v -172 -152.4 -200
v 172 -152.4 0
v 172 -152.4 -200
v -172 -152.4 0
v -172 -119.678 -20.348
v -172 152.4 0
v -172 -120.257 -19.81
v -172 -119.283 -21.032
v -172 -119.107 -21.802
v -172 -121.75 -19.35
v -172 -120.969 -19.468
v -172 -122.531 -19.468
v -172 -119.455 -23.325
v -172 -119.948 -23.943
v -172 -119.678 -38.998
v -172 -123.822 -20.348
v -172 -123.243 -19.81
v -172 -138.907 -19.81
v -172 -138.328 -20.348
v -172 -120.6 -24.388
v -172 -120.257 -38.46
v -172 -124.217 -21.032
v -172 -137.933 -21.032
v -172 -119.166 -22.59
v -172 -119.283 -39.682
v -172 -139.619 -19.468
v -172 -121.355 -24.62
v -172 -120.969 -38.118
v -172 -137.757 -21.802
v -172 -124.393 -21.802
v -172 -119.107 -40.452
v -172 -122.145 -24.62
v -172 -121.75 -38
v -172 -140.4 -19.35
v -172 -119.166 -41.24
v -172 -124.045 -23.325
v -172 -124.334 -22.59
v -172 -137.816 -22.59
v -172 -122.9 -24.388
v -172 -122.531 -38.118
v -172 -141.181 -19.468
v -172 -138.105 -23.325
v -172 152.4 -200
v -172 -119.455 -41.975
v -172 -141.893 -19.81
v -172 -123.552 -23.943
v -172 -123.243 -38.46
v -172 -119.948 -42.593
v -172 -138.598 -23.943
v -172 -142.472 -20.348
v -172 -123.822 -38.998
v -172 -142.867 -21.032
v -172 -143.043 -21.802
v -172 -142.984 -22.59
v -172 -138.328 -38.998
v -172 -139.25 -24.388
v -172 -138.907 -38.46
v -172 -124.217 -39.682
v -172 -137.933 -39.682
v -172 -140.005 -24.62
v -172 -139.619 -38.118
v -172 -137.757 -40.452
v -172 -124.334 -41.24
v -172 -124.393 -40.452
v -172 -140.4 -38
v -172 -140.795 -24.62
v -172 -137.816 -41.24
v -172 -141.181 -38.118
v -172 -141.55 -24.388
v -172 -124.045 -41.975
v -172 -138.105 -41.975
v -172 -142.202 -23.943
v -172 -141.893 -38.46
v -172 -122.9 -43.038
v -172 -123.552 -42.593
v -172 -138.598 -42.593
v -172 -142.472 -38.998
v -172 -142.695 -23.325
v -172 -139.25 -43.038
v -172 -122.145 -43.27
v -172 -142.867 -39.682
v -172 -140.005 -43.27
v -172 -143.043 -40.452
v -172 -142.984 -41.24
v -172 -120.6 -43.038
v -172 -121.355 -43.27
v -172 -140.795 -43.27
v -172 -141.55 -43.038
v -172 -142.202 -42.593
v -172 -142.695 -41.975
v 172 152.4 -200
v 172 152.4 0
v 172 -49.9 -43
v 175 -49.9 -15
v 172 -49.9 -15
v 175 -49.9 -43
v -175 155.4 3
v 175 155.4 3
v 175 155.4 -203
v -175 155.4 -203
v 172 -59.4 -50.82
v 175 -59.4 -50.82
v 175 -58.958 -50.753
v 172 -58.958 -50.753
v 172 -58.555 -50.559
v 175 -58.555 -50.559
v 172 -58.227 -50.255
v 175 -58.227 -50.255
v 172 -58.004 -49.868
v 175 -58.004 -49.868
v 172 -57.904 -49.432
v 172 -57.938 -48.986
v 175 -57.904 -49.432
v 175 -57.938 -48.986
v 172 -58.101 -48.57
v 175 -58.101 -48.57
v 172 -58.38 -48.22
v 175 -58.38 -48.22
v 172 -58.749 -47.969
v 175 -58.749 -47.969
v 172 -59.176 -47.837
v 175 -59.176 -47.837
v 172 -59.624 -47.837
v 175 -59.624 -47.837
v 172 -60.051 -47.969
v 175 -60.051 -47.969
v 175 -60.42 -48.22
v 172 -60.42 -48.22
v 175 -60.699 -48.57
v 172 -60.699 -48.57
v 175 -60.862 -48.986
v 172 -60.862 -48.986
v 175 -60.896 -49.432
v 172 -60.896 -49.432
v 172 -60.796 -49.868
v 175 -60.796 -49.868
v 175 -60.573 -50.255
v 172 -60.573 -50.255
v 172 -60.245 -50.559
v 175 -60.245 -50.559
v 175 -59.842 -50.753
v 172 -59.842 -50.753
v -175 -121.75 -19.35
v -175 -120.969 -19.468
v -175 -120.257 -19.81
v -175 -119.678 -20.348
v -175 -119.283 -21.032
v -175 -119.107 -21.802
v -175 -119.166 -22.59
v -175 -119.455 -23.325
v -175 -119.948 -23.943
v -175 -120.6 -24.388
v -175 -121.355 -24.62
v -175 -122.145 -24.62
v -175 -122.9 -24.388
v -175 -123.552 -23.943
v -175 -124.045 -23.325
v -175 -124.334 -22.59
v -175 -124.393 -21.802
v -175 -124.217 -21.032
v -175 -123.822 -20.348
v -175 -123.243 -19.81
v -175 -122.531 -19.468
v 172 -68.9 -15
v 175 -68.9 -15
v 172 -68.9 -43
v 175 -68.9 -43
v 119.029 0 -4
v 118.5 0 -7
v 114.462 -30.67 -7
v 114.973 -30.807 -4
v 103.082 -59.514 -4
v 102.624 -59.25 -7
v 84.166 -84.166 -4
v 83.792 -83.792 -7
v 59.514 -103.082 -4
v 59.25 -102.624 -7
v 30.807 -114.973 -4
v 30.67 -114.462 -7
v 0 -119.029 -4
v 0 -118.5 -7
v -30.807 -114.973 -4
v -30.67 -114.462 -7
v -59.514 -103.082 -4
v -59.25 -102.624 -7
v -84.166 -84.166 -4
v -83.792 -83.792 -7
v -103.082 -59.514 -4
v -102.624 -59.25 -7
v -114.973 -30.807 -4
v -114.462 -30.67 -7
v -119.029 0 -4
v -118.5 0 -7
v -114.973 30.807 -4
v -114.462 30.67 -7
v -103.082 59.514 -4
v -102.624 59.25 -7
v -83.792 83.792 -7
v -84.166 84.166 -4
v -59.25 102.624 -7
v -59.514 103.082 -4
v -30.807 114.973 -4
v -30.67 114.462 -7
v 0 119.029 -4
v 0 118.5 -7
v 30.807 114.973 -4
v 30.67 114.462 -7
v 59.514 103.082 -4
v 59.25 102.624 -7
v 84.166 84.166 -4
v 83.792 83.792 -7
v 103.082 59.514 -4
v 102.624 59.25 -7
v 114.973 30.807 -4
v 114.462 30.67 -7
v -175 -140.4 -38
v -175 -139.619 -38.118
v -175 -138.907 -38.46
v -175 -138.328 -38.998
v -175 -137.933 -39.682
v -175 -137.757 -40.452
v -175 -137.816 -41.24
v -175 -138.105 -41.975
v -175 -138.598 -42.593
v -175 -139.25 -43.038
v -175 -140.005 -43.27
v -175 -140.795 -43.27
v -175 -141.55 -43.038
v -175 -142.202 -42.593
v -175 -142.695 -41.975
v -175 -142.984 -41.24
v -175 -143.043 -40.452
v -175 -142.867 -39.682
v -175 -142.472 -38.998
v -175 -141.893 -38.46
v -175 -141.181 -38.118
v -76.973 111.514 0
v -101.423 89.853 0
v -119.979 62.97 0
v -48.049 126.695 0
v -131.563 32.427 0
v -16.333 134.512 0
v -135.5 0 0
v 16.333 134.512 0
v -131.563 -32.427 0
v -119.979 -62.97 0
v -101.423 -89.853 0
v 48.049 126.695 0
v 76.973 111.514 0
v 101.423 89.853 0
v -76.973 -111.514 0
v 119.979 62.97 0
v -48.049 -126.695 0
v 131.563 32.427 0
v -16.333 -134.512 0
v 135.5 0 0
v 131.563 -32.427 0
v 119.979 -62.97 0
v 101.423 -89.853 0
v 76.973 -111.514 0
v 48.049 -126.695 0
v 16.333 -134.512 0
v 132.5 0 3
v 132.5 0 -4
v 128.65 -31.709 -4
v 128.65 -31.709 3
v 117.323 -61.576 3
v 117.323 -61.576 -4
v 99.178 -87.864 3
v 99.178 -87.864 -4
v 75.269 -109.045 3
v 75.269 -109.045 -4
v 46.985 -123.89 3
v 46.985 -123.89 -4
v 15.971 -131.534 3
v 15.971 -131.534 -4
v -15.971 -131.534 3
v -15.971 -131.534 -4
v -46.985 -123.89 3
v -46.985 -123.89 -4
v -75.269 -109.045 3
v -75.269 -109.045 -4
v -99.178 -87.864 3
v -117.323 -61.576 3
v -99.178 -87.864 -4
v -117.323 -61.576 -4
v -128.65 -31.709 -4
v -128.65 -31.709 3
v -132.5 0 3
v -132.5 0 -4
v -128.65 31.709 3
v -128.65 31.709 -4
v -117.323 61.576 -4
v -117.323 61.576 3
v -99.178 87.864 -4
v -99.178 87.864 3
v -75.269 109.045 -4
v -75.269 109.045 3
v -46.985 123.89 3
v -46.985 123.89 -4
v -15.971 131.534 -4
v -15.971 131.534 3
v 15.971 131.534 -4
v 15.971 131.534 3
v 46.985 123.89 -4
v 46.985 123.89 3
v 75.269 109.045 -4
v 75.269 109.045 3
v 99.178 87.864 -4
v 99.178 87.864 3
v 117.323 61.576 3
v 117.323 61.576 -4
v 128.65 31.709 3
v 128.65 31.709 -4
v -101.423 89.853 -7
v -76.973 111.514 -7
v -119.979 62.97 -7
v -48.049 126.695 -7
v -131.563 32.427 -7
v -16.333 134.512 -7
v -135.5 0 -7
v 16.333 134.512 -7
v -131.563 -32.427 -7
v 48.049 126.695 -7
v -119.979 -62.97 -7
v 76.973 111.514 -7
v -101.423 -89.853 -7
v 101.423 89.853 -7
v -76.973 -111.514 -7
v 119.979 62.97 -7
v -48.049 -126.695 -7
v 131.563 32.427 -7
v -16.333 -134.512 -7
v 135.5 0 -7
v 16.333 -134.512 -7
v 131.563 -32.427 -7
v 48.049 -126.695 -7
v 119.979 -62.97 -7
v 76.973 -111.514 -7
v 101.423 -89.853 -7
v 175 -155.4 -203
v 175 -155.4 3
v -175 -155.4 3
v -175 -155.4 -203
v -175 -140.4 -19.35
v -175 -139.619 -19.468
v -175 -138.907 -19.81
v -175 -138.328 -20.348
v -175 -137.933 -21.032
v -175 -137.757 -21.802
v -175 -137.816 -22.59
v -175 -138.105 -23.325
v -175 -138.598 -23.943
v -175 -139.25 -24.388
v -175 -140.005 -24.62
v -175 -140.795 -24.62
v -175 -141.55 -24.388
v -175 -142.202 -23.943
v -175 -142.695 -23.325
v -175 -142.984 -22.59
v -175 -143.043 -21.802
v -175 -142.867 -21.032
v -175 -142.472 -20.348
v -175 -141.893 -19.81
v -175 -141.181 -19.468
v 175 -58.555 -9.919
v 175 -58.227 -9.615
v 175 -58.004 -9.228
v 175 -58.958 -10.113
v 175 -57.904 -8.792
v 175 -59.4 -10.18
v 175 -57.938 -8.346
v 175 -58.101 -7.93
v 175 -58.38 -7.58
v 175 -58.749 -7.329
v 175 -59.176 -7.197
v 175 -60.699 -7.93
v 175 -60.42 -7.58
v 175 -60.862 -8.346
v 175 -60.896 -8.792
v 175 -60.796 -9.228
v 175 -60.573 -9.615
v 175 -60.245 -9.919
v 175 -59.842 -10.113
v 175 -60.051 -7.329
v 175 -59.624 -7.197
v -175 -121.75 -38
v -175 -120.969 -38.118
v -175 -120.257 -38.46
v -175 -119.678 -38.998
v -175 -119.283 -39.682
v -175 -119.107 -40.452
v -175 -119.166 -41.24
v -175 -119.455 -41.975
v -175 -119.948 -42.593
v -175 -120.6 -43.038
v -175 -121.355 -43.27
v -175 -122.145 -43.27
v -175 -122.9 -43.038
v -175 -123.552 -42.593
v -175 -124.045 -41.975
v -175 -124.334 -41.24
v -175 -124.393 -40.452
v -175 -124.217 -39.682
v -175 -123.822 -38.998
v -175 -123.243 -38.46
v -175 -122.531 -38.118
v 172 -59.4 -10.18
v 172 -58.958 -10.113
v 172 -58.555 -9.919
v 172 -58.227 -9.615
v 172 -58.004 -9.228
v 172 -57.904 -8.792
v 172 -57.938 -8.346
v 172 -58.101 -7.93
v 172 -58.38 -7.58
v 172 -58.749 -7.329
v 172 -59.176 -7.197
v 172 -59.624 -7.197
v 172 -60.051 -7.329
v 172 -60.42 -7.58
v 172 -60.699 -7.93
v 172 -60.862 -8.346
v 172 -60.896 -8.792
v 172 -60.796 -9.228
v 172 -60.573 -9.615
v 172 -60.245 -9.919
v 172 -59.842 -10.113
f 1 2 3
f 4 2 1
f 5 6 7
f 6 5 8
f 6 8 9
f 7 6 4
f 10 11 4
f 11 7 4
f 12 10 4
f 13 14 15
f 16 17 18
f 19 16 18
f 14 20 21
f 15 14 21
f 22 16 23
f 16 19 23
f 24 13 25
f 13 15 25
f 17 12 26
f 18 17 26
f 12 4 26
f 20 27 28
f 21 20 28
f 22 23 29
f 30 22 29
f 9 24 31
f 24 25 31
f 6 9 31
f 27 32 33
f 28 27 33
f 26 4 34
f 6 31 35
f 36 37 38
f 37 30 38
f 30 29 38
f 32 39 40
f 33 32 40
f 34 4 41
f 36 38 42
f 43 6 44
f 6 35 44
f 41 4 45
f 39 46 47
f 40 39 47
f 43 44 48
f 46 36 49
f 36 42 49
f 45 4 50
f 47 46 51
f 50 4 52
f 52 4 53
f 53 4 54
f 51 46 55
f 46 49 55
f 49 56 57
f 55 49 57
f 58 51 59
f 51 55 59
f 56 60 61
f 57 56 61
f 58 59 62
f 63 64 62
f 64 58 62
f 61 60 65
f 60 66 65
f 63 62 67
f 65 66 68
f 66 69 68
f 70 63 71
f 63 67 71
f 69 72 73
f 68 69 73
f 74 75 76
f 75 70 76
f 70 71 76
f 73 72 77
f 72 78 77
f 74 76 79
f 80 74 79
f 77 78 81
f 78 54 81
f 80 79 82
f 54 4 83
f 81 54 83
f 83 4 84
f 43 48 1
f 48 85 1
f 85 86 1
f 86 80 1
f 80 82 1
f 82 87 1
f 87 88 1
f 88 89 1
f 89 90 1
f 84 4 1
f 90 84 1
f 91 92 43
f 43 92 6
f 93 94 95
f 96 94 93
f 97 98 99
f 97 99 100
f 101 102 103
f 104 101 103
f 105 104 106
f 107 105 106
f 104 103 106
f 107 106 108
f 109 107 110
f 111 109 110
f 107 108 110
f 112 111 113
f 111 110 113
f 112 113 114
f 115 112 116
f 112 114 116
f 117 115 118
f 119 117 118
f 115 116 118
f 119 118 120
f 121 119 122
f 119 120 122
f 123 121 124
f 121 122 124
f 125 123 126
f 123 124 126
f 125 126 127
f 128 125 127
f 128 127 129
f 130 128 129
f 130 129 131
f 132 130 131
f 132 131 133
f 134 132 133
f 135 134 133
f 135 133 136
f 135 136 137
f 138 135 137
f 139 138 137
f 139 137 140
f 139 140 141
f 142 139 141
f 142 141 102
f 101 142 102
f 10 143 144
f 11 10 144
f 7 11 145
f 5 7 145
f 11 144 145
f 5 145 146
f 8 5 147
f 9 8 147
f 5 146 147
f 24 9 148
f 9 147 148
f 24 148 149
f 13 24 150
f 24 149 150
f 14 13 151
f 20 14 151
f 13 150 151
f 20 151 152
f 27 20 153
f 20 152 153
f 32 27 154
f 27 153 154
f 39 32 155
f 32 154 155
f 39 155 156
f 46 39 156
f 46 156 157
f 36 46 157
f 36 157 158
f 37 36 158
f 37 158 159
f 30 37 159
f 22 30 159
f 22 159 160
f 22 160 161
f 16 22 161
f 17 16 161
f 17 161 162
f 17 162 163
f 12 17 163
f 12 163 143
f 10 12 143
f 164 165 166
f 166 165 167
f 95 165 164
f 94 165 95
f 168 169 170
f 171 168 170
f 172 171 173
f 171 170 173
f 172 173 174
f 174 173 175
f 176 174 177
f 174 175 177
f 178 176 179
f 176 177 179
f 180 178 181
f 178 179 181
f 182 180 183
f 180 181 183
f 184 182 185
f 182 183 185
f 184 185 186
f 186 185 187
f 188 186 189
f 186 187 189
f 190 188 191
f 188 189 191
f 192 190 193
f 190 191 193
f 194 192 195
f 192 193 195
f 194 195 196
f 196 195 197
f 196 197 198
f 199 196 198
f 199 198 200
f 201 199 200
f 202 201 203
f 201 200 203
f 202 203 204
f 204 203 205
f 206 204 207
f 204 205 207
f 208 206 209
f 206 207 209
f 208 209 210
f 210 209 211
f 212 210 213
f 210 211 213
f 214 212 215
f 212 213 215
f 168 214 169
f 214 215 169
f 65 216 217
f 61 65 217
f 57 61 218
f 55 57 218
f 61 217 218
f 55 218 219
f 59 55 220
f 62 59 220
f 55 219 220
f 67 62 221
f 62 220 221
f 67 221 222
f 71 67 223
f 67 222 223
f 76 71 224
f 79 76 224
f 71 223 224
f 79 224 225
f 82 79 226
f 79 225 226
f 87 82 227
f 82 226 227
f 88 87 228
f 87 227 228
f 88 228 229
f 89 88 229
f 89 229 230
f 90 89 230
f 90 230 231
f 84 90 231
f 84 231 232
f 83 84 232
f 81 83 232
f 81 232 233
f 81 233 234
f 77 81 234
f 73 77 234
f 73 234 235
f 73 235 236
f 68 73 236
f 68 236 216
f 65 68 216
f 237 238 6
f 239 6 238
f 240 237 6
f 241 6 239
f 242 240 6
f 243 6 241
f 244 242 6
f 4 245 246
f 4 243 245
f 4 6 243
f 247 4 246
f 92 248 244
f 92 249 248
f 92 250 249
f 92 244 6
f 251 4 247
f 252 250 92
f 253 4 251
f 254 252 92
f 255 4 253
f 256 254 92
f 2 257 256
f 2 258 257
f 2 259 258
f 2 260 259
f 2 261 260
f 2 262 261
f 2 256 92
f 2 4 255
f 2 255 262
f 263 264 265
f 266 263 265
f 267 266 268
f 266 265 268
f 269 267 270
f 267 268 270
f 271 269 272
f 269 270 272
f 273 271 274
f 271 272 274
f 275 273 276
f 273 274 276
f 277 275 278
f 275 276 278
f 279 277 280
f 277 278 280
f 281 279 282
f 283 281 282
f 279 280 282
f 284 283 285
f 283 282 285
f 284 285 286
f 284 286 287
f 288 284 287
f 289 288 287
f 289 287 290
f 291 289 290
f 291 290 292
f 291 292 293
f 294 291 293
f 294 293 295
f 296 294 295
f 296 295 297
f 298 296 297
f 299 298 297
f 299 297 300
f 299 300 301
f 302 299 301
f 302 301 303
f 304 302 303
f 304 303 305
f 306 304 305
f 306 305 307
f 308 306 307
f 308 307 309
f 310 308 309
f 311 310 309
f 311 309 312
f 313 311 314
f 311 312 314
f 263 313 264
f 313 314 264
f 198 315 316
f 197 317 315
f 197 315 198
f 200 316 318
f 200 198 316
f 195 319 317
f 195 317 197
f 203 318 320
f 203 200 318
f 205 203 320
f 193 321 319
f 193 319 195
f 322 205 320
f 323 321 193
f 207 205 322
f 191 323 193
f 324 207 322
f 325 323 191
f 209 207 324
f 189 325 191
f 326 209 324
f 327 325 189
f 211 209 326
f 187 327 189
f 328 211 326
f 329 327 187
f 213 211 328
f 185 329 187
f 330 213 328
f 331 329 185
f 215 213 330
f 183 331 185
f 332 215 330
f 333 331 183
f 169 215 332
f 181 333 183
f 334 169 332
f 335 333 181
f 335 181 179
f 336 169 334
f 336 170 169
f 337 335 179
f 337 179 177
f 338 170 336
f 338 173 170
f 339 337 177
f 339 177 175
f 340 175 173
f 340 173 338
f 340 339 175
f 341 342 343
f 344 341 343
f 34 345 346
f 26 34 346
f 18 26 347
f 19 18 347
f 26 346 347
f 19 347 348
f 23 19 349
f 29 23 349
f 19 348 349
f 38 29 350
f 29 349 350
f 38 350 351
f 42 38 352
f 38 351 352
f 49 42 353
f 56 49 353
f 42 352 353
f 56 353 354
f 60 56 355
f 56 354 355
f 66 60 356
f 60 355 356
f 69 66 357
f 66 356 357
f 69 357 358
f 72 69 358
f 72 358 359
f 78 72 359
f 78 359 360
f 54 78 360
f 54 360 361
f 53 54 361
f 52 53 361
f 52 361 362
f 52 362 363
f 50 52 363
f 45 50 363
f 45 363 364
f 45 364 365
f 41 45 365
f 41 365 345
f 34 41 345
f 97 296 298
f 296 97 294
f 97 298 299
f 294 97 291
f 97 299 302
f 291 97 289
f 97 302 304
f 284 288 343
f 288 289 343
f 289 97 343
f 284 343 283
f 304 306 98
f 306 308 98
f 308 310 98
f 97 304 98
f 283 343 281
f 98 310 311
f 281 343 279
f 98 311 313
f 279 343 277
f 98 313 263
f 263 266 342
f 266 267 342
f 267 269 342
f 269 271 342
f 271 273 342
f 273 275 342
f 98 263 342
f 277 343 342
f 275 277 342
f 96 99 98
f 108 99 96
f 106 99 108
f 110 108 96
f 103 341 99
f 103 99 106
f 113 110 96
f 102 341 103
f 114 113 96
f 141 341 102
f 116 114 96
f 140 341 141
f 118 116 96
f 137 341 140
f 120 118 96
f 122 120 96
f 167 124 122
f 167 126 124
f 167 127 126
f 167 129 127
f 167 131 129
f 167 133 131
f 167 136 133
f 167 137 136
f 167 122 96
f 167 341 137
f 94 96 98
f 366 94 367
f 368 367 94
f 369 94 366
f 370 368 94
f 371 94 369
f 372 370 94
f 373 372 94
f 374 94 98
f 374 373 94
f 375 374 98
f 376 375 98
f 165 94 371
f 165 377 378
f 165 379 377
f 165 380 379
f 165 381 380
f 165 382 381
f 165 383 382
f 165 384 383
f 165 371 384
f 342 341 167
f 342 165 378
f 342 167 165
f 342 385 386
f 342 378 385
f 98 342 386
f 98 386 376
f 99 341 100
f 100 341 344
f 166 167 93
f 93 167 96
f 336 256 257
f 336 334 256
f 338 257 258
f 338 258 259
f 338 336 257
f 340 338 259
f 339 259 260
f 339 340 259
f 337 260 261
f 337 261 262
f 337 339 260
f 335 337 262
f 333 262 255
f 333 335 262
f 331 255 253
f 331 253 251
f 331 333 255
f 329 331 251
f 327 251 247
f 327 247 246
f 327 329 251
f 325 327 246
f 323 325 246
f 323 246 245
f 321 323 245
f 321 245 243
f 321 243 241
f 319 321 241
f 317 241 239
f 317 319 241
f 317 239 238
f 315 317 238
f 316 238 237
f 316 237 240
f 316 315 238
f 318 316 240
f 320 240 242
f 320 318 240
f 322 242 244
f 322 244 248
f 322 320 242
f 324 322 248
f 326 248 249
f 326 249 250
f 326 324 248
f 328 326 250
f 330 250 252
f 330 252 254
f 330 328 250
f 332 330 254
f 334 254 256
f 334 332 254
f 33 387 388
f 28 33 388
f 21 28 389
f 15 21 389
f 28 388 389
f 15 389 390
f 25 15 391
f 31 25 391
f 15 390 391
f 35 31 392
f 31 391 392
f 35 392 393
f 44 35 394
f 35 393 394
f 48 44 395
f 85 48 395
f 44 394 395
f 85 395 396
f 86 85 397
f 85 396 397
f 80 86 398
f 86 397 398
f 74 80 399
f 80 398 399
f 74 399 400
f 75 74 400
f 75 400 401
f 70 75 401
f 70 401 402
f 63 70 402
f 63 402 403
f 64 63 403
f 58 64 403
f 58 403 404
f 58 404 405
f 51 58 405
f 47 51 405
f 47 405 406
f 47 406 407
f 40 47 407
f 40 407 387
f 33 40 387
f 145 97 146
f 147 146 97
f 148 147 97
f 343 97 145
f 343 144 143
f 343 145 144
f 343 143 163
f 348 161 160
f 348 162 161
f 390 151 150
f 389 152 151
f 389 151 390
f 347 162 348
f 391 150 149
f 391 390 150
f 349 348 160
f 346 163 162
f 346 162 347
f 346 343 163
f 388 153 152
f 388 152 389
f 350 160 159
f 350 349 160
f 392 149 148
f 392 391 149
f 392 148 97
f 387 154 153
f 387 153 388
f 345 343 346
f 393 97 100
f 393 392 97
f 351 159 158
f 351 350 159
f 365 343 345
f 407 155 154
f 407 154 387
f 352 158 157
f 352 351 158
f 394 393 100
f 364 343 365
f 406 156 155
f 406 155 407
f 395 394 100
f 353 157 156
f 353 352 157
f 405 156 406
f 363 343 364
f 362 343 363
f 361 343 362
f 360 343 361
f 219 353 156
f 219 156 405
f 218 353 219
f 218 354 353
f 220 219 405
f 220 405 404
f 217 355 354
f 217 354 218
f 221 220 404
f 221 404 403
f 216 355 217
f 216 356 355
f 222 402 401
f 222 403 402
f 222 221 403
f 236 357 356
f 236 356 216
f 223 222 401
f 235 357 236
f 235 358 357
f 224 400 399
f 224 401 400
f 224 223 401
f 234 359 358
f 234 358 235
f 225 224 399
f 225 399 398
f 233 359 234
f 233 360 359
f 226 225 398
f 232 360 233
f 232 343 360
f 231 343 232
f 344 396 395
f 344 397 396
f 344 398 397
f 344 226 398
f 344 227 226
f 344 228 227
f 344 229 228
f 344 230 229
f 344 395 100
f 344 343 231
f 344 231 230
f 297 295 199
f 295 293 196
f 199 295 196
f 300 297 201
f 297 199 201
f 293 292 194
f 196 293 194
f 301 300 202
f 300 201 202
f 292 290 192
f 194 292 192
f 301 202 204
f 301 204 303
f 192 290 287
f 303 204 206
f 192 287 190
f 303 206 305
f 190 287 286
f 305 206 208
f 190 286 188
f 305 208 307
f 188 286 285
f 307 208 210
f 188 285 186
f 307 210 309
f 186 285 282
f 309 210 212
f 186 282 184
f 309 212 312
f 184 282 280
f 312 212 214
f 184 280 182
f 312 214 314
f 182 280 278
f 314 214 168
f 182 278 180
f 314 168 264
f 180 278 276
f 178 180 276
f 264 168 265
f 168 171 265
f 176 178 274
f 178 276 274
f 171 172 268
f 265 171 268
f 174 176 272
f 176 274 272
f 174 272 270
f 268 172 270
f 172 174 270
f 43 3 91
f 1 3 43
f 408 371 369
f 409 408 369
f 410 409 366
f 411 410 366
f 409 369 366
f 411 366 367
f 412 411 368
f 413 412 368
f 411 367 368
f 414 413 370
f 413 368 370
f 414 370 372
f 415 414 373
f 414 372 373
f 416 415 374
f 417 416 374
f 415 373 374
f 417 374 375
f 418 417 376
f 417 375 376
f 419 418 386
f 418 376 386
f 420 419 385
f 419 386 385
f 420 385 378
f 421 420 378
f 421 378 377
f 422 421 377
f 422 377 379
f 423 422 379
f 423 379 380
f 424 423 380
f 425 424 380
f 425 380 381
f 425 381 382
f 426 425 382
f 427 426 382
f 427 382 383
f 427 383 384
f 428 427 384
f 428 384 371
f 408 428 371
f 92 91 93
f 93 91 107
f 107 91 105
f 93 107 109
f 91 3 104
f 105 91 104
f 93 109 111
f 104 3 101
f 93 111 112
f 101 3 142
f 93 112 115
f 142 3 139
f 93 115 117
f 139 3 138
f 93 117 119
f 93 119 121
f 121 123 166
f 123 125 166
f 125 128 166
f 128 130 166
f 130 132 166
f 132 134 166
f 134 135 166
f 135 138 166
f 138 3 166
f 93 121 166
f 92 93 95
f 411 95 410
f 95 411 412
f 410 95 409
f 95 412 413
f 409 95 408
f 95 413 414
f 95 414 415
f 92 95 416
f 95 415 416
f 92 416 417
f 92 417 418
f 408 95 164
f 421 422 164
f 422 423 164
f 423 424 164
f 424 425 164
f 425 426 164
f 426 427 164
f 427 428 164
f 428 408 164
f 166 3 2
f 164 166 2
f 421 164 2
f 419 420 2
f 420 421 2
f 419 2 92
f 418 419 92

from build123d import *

# Parameters (mm, degrees)
SKETCH1_W           = 300
SKETCH1_H           = 304.8
BOSS_EXTRUDE1_DEPTH = 200
BOSS_EXTRUDE3_DEPTH = 304.8
SHELL1_T            = 3
CUT_EXTRUDE3_REACH  = 435.426
SKETCH8_R           = 2.65
CUT_EXTRUDE4_REACH  = 435.426
SKETCH9_R           = 1.5
SKETCH9_W           = 28
SKETCH9_H           = 19


with BuildPart() as part:
    # Sketch1 → Boss-Extrude1 (new body)
    with BuildSketch(Plane.XY):
        Rectangle(SKETCH1_W, SKETCH1_H)
    extrude(amount=-BOSS_EXTRUDE1_DEPTH)

    # Sketch7 → Boss-Extrude3 (add, through all)
    with BuildSketch(Plane.XZ.offset(152.4)):
        Polygon((-172, -200), (-172, -127.5), (-172, 0), (172, 0), (172, -127.5), (172, -200), align=None)
    extrude(amount=-BOSS_EXTRUDE3_DEPTH)

    # Sketch2 → Cut-Revolve1 (revolve, cut)
    with BuildSketch(Plane(origin=(0, 0, 0), x_dir=(1, 0, 0), z_dir=(0, 1, 0))):
        Polygon((0, 0), (135.5, 0), (135.5, 7), (118.5, 7), (111.799574733, 45), (0, 45), align=None)
    revolve(axis=Axis((0, 0, 0), (0, 0, -1)), mode=Mode.SUBTRACT)

    # Shell1
    shell1_openings = [part.faces().sort_by_distance(p)[0] for p in [
        (-115.149787367, 0, -26),
        (0, 0, -45),
    ]]
    offset(amount=SHELL1_T, openings=shell1_openings, kind=Kind.INTERSECTION)

    # Sketch8 → Cut-Extrude3 (cut, up to next)
    with BuildSketch(Plane.ZY.offset(175), mode=Mode.PRIVATE) as cut_extrude3_sk1:
        with Locations((-40.65, -121.75)):
            Circle(SKETCH8_R)
    cut_extrude3_tool1 = extrude(cut_extrude3_sk1.sketch, amount=-CUT_EXTRUDE3_REACH, mode=Mode.PRIVATE) & part.part
    # Sketch8 → Cut-Extrude3 (cut, up to next)
    with BuildSketch(Plane.ZY.offset(175), mode=Mode.PRIVATE) as cut_extrude3_sk2:
        with Locations((-22, -121.75)):
            Circle(SKETCH8_R)
    cut_extrude3_tool2 = extrude(cut_extrude3_sk2.sketch, amount=-CUT_EXTRUDE3_REACH, mode=Mode.PRIVATE) & part.part
    # Sketch8 → Cut-Extrude3 (cut, up to next)
    with BuildSketch(Plane.ZY.offset(175), mode=Mode.PRIVATE) as cut_extrude3_sk3:
        with Locations((-22, -140.4)):
            Circle(SKETCH8_R)
    cut_extrude3_tool3 = extrude(cut_extrude3_sk3.sketch, amount=-CUT_EXTRUDE3_REACH, mode=Mode.PRIVATE) & part.part
    # Sketch8 → Cut-Extrude3 (cut, up to next)
    with BuildSketch(Plane.ZY.offset(175), mode=Mode.PRIVATE) as cut_extrude3_sk4:
        with Locations((-40.65, -140.4)):
            Circle(SKETCH8_R)
    cut_extrude3_tool4 = extrude(cut_extrude3_sk4.sketch, amount=-CUT_EXTRUDE3_REACH, mode=Mode.PRIVATE) & part.part
    add(cut_extrude3_tool1.solids().sort_by_distance((-175, -121.75, -40.65))[0], mode=Mode.SUBTRACT)
    add(cut_extrude3_tool2.solids().sort_by_distance((-175, -121.75, -22))[0], mode=Mode.SUBTRACT)
    add(cut_extrude3_tool3.solids().sort_by_distance((-175, -140.4, -22))[0], mode=Mode.SUBTRACT)
    add(cut_extrude3_tool4.solids().sort_by_distance((-175, -140.4, -40.65))[0], mode=Mode.SUBTRACT)

    # Sketch9 → Cut-Extrude4 (cut, up to next)
    with BuildSketch(Plane(origin=(175, 0, 0), x_dir=(0, 0, -1), z_dir=(1, 0, 0)), mode=Mode.PRIVATE) as cut_extrude4_sk1:
        with Locations((8.68, -59.4)):
            Circle(SKETCH9_R)
    cut_extrude4_tool1 = extrude(cut_extrude4_sk1.sketch, amount=-CUT_EXTRUDE4_REACH, mode=Mode.PRIVATE) & part.part
    # Sketch9 → Cut-Extrude4 (cut, up to next)
    with BuildSketch(Plane(origin=(175, 0, 0), x_dir=(0, 0, -1), z_dir=(1, 0, 0)), mode=Mode.PRIVATE) as cut_extrude4_sk2:
        with Locations((49.32, -59.4)):
            Circle(SKETCH9_R)
    cut_extrude4_tool2 = extrude(cut_extrude4_sk2.sketch, amount=-CUT_EXTRUDE4_REACH, mode=Mode.PRIVATE) & part.part
    # Sketch9 → Cut-Extrude4 (cut, up to next)
    with BuildSketch(Plane(origin=(175, 0, 0), x_dir=(0, 0, -1), z_dir=(1, 0, 0)), mode=Mode.PRIVATE) as cut_extrude4_sk3:
        with Locations((29, -59.4)):
            Rectangle(SKETCH9_W, SKETCH9_H)
    cut_extrude4_tool3 = extrude(cut_extrude4_sk3.sketch, amount=-CUT_EXTRUDE4_REACH, mode=Mode.PRIVATE) & part.part
    add(cut_extrude4_tool1.solids().sort_by_distance((175, -59.4, -8.68))[0], mode=Mode.SUBTRACT)
    add(cut_extrude4_tool2.solids().sort_by_distance((175, -59.4, -49.32))[0], mode=Mode.SUBTRACT)
    add(cut_extrude4_tool3.solids().sort_by_distance((175, -59.4, -29))[0], mode=Mode.SUBTRACT)


solid = part.part
